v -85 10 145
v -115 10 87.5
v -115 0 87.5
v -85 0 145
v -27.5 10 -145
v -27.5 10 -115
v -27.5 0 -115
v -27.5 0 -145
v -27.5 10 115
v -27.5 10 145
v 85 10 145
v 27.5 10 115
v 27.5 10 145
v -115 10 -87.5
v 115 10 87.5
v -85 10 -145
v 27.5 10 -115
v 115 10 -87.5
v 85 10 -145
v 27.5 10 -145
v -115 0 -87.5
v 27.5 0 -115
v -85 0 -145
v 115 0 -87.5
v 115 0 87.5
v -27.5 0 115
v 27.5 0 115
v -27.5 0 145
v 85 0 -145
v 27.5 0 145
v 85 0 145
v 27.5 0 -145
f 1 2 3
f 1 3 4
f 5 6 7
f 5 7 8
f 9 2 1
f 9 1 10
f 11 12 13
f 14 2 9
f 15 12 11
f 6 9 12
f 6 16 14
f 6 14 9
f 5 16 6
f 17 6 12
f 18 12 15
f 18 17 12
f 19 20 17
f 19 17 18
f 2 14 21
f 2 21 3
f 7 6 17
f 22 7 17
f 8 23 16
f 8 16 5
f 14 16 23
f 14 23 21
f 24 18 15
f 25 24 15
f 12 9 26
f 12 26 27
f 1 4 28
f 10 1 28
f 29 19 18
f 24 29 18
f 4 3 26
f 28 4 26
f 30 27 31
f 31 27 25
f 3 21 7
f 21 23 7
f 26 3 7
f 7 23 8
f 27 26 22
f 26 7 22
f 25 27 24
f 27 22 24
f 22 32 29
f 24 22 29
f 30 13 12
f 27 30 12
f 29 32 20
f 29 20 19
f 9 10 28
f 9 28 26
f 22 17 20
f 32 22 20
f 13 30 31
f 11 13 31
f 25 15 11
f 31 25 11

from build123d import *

# Parameters (mm, degrees)
SKETCH1_W           = 310
SKETCH1_H           = 290
BOSS_EXTRUDE1_DEPTH = 10
CUT_EXTRUDE1_DEPTH  = 213.485293609
SKETCH3_W           = 55
SKETCH3_H           = 30
CUT_EXTRUDE2_DEPTH  = 186.33752993


with BuildPart() as part:
    # Sketch1 → Boss-Extrude1 (new body)
    with BuildSketch(Plane(origin=(0, 0, 0), x_dir=(1, 0, 0), z_dir=(0, 1, 0))):
        Rectangle(SKETCH1_W, SKETCH1_H)
    extrude(amount=BOSS_EXTRUDE1_DEPTH)

    # Sketch2 → Cut-Extrude1 (cut, through all)
    with BuildSketch(Plane(origin=(0, 10, 0), x_dir=(1, 0, 0), z_dir=(0, 1, 0))):
        Polygon((-85, 145), (-115.000000002, 87.5), (-115.000000002, -87.5), (-85, -145), (-155, -145), (-155, 145), align=None)
        Polygon((155, -145), (155, 145), (85, 145), (115.000000002, 87.5), (115.000000002, -87.5), (85, -145), align=None)
    extrude(amount=-CUT_EXTRUDE1_DEPTH, mode=Mode.SUBTRACT)

    # Sketch3 → Cut-Extrude2 (cut, through all)
    with BuildSketch(Plane(origin=(0, 10, 0), x_dir=(1, 0, 0), z_dir=(0, 1, 0))):
        with Locations((0, 130)):
            Rectangle(SKETCH3_W, SKETCH3_H)
        with Locations((0, -130)):
            Rectangle(SKETCH3_W, SKETCH3_H)
    extrude(amount=-CUT_EXTRUDE2_DEPTH, mode=Mode.SUBTRACT)


solid = part.part
